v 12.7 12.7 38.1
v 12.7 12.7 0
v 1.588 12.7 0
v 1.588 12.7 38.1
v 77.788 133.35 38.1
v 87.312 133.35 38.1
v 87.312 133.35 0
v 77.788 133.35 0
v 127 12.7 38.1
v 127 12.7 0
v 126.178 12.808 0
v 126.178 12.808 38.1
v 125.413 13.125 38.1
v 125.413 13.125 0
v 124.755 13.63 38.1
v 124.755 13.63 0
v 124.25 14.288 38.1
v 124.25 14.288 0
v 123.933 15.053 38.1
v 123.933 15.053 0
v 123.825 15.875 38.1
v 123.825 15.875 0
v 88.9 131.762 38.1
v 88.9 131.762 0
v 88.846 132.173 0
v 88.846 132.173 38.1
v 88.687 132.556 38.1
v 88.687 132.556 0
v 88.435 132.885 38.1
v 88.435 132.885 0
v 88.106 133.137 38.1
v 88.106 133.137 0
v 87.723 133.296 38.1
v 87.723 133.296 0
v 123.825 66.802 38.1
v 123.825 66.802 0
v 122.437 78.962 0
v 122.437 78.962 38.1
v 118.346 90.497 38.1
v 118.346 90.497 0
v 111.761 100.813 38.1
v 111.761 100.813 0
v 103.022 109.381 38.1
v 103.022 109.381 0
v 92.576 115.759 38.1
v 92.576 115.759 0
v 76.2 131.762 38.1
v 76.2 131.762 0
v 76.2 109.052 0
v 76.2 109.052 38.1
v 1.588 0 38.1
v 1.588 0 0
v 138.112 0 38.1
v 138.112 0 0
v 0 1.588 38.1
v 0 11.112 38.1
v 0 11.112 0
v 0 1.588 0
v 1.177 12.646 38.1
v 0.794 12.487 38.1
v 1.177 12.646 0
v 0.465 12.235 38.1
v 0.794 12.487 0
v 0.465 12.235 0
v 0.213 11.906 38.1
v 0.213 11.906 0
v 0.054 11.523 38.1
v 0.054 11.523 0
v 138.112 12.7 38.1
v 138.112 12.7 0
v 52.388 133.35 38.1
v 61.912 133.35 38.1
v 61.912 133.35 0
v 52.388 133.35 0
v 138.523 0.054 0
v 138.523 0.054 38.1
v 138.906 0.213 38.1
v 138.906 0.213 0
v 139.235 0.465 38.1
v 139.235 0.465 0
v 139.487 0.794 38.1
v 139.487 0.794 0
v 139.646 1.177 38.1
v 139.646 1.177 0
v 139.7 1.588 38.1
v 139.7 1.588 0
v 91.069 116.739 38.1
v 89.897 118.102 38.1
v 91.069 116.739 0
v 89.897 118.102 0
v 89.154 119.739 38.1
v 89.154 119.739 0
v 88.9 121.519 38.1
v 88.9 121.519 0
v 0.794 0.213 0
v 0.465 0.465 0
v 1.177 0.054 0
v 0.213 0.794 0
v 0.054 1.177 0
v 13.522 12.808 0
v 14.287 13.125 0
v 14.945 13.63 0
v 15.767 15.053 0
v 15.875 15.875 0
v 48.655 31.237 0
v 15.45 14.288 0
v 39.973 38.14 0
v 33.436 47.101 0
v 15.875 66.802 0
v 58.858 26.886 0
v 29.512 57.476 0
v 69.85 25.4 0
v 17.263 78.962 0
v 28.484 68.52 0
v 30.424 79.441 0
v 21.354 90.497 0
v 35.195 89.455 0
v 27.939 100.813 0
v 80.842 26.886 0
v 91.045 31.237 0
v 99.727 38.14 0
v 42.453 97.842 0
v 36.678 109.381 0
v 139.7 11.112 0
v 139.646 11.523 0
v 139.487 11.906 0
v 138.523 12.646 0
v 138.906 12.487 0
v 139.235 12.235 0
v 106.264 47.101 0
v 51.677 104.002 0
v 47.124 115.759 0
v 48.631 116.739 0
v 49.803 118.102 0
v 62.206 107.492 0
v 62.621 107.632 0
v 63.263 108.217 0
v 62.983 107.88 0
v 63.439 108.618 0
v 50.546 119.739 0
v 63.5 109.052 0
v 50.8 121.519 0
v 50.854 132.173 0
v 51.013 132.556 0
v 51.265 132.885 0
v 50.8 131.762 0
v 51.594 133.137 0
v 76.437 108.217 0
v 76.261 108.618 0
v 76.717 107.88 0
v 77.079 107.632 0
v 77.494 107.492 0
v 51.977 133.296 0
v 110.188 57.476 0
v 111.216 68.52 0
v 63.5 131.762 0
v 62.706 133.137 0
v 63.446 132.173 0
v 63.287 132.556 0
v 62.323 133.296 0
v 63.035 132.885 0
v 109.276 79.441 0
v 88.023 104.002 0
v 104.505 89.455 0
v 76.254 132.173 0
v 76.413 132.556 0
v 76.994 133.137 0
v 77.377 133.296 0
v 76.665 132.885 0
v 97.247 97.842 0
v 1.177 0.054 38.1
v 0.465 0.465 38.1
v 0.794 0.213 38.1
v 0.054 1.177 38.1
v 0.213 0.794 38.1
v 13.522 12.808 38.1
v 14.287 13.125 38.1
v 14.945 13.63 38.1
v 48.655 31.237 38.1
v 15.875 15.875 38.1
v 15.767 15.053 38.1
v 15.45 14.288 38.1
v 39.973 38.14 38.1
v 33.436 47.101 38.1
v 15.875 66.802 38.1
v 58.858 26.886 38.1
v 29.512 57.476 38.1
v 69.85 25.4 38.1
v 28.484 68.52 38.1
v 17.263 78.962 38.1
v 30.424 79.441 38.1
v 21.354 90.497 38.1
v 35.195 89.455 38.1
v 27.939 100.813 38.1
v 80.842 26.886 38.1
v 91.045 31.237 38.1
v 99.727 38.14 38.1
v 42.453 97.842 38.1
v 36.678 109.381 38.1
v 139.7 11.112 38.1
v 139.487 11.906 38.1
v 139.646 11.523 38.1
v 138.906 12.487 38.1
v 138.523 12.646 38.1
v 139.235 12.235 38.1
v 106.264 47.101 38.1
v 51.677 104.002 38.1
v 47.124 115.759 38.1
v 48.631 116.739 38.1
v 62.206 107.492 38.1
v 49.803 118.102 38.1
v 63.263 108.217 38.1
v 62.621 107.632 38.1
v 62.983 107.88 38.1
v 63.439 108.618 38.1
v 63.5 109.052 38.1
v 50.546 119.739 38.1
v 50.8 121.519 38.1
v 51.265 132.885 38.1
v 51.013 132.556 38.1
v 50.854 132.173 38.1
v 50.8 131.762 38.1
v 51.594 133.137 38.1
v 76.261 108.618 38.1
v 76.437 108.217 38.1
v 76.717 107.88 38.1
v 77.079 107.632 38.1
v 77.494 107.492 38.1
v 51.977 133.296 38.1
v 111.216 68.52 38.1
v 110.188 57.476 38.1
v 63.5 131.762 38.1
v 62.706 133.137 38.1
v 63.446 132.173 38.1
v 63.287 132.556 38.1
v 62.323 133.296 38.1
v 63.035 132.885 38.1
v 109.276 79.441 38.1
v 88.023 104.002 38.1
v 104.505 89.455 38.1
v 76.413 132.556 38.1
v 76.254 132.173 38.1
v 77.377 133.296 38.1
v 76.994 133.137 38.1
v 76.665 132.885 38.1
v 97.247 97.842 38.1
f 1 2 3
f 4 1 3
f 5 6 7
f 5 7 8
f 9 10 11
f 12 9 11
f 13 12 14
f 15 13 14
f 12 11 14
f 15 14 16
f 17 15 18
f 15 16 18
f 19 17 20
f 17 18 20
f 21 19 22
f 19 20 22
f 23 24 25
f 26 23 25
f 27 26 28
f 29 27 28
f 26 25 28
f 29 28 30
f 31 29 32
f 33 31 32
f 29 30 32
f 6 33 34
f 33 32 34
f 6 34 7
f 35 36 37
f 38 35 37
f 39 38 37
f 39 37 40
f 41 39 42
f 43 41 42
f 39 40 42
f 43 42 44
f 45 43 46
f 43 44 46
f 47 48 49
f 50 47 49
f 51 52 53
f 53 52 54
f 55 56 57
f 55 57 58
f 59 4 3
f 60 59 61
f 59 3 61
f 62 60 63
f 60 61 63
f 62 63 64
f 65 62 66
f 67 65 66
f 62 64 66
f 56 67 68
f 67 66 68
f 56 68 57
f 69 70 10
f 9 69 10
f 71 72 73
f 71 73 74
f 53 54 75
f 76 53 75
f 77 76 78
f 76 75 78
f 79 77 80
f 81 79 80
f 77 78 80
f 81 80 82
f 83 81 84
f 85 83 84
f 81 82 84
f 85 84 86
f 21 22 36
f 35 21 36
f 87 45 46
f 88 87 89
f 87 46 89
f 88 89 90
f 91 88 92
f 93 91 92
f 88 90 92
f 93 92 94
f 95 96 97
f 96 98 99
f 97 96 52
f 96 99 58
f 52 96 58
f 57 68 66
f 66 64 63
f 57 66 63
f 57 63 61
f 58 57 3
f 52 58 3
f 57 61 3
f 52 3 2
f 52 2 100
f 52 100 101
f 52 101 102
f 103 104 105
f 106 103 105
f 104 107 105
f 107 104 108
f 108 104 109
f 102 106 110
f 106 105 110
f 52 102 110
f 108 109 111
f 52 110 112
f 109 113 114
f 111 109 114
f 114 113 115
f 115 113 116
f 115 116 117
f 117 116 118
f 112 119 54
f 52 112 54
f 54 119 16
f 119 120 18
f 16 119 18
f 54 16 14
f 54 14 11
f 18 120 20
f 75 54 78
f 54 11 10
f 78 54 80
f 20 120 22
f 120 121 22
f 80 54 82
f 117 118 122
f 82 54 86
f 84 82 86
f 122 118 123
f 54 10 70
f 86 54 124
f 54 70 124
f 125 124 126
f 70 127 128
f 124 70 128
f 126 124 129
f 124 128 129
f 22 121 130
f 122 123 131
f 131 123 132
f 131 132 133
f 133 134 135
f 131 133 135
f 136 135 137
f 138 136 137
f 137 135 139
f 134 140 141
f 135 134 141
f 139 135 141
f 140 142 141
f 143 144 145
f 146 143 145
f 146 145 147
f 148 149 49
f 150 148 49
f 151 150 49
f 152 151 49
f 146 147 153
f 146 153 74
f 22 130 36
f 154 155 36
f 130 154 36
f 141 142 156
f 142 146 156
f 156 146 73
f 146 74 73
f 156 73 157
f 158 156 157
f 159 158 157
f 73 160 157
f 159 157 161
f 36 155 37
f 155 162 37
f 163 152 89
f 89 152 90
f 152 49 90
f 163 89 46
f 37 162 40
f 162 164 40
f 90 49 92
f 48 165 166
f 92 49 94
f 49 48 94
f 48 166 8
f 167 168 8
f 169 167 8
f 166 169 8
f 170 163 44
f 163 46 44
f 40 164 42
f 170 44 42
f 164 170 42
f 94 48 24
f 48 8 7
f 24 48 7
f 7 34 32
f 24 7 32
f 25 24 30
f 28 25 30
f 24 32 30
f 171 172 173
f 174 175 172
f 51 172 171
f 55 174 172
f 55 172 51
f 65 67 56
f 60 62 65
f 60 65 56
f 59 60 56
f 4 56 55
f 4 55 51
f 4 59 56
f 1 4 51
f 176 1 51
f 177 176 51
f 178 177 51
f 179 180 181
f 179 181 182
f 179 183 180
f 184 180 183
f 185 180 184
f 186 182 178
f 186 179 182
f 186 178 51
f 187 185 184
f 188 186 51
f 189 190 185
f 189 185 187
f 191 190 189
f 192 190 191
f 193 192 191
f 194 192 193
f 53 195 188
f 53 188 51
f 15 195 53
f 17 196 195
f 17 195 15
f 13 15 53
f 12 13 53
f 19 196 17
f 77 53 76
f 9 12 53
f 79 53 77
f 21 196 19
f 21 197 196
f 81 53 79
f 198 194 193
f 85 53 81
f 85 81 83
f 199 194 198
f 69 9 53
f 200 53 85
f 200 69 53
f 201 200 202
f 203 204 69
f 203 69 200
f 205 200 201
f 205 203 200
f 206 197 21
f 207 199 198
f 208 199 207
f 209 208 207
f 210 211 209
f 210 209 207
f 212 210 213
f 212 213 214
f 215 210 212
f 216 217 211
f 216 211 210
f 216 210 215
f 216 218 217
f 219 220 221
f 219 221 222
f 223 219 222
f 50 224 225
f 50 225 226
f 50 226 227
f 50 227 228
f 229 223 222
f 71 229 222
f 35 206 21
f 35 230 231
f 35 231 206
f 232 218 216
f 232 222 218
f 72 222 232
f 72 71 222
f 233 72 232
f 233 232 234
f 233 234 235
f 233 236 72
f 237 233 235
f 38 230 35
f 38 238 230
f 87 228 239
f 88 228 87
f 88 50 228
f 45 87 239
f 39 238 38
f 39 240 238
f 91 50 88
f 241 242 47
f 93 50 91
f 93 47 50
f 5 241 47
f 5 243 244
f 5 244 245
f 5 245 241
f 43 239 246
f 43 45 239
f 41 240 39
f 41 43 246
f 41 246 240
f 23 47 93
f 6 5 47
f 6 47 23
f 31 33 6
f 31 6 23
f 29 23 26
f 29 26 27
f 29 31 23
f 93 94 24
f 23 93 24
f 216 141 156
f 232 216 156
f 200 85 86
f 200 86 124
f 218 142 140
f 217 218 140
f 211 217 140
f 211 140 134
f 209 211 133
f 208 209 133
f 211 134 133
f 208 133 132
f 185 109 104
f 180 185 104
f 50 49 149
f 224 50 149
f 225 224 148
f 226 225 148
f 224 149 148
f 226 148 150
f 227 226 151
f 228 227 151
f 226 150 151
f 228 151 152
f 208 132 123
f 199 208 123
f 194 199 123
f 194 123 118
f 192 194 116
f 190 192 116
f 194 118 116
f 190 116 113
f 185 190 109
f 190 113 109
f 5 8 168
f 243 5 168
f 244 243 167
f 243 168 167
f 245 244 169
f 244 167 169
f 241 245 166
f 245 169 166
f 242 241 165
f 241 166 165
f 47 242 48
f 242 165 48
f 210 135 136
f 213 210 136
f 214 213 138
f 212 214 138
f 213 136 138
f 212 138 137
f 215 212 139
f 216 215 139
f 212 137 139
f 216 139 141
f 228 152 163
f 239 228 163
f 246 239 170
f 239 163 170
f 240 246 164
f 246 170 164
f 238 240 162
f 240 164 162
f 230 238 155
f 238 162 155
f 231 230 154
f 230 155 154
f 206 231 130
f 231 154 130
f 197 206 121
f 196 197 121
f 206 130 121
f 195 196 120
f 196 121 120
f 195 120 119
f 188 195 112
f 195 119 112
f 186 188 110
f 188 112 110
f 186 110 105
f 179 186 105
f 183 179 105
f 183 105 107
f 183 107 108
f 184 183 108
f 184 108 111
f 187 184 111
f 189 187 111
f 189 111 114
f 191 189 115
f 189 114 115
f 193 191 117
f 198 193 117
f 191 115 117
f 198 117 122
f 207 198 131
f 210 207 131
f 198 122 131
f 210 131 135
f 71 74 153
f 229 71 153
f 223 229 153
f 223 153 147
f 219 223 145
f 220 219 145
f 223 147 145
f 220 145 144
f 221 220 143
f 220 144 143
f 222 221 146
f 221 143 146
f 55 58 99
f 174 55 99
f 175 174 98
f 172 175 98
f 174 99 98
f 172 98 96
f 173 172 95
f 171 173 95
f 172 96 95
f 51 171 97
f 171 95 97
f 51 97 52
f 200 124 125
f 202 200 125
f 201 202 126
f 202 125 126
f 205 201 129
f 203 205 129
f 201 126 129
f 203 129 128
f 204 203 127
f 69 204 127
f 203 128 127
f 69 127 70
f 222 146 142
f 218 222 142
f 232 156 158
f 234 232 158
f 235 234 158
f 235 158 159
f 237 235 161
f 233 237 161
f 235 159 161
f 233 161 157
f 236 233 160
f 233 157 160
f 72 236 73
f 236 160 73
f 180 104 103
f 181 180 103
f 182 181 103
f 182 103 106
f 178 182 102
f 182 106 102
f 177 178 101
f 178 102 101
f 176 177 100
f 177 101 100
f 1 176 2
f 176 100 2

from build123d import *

# Parameters (mm, degrees)
F1_DEPTH = 38.1


with BuildPart() as f1:
    # F0 (on Top) → F1 (new body)
    with BuildSketch(Plane.XY):
        with BuildLine():
            ThreePointArc((0, 1.5875), (0.464968, 0.464968), (1.5875, 0))
            Line((1.5875, 0), (138.1125, 0))
            ThreePointArc((138.1125, 0), (139.235032, 0.464968), (139.7, 1.5875))
            Line((139.7, 1.5875), (139.7, 11.1125))
            ThreePointArc((139.7, 11.1125), (139.235032, 12.235032), (138.1125, 12.7))
            Line((138.1125, 12.7), (127, 12.7))
            ThreePointArc((127, 12.7), (124.754936, 13.629936), (123.825, 15.875))
            Line((123.825, 15.875), (123.825, 66.802))
            ThreePointArc((123.825, 66.802), (115.346997, 95.842039), (92.576316, 115.759279))
            ThreePointArc((92.576316, 115.759279), (89.897412, 118.102484), (88.9, 121.518959))
            Line((88.9, 121.518959), (88.9, 131.7625))
            ThreePointArc((88.9, 131.7625), (88.435032, 132.885032), (87.3125, 133.35))
            Line((87.3125, 133.35), (77.7875, 133.35))
            ThreePointArc((77.7875, 133.35), (76.664968, 132.885032), (76.2, 131.7625))
            Line((76.2, 131.7625), (76.2, 109.052363))
            ThreePointArc((76.2, 109.052363), (76.565724, 108.038746), (77.494387, 107.492158))
            ThreePointArc((77.494387, 107.492158), (69.85, 25.4), (62.205613, 107.492158))
            ThreePointArc((62.205613, 107.492158), (63.134276, 108.038746), (63.5, 109.052363))
            Line((63.5, 109.052363), (63.5, 131.7625))
            ThreePointArc((63.5, 131.7625), (63.035032, 132.885032), (61.9125, 133.35))
            Line((61.9125, 133.35), (52.3875, 133.35))
            ThreePointArc((52.3875, 133.35), (51.264968, 132.885032), (50.8, 131.7625))
            Line((50.8, 131.7625), (50.8, 121.518959))
            ThreePointArc((50.8, 121.518959), (49.802588, 118.102484), (47.123684, 115.759279))
            ThreePointArc((47.123684, 115.759279), (24.353003, 95.842039), (15.875, 66.802))
            Line((15.875, 66.802), (15.875, 15.875))
            ThreePointArc((15.875, 15.875), (14.945064, 13.629936), (12.7, 12.7))
            Line((12.7, 12.7), (1.5875, 12.7))
            ThreePointArc((1.5875, 12.7), (0.464968, 12.235032), (0, 11.1125))
            Line((0, 11.1125), (0, 1.5875))
        make_face()
    extrude(amount=F1_DEPTH)


solid = f1.part
